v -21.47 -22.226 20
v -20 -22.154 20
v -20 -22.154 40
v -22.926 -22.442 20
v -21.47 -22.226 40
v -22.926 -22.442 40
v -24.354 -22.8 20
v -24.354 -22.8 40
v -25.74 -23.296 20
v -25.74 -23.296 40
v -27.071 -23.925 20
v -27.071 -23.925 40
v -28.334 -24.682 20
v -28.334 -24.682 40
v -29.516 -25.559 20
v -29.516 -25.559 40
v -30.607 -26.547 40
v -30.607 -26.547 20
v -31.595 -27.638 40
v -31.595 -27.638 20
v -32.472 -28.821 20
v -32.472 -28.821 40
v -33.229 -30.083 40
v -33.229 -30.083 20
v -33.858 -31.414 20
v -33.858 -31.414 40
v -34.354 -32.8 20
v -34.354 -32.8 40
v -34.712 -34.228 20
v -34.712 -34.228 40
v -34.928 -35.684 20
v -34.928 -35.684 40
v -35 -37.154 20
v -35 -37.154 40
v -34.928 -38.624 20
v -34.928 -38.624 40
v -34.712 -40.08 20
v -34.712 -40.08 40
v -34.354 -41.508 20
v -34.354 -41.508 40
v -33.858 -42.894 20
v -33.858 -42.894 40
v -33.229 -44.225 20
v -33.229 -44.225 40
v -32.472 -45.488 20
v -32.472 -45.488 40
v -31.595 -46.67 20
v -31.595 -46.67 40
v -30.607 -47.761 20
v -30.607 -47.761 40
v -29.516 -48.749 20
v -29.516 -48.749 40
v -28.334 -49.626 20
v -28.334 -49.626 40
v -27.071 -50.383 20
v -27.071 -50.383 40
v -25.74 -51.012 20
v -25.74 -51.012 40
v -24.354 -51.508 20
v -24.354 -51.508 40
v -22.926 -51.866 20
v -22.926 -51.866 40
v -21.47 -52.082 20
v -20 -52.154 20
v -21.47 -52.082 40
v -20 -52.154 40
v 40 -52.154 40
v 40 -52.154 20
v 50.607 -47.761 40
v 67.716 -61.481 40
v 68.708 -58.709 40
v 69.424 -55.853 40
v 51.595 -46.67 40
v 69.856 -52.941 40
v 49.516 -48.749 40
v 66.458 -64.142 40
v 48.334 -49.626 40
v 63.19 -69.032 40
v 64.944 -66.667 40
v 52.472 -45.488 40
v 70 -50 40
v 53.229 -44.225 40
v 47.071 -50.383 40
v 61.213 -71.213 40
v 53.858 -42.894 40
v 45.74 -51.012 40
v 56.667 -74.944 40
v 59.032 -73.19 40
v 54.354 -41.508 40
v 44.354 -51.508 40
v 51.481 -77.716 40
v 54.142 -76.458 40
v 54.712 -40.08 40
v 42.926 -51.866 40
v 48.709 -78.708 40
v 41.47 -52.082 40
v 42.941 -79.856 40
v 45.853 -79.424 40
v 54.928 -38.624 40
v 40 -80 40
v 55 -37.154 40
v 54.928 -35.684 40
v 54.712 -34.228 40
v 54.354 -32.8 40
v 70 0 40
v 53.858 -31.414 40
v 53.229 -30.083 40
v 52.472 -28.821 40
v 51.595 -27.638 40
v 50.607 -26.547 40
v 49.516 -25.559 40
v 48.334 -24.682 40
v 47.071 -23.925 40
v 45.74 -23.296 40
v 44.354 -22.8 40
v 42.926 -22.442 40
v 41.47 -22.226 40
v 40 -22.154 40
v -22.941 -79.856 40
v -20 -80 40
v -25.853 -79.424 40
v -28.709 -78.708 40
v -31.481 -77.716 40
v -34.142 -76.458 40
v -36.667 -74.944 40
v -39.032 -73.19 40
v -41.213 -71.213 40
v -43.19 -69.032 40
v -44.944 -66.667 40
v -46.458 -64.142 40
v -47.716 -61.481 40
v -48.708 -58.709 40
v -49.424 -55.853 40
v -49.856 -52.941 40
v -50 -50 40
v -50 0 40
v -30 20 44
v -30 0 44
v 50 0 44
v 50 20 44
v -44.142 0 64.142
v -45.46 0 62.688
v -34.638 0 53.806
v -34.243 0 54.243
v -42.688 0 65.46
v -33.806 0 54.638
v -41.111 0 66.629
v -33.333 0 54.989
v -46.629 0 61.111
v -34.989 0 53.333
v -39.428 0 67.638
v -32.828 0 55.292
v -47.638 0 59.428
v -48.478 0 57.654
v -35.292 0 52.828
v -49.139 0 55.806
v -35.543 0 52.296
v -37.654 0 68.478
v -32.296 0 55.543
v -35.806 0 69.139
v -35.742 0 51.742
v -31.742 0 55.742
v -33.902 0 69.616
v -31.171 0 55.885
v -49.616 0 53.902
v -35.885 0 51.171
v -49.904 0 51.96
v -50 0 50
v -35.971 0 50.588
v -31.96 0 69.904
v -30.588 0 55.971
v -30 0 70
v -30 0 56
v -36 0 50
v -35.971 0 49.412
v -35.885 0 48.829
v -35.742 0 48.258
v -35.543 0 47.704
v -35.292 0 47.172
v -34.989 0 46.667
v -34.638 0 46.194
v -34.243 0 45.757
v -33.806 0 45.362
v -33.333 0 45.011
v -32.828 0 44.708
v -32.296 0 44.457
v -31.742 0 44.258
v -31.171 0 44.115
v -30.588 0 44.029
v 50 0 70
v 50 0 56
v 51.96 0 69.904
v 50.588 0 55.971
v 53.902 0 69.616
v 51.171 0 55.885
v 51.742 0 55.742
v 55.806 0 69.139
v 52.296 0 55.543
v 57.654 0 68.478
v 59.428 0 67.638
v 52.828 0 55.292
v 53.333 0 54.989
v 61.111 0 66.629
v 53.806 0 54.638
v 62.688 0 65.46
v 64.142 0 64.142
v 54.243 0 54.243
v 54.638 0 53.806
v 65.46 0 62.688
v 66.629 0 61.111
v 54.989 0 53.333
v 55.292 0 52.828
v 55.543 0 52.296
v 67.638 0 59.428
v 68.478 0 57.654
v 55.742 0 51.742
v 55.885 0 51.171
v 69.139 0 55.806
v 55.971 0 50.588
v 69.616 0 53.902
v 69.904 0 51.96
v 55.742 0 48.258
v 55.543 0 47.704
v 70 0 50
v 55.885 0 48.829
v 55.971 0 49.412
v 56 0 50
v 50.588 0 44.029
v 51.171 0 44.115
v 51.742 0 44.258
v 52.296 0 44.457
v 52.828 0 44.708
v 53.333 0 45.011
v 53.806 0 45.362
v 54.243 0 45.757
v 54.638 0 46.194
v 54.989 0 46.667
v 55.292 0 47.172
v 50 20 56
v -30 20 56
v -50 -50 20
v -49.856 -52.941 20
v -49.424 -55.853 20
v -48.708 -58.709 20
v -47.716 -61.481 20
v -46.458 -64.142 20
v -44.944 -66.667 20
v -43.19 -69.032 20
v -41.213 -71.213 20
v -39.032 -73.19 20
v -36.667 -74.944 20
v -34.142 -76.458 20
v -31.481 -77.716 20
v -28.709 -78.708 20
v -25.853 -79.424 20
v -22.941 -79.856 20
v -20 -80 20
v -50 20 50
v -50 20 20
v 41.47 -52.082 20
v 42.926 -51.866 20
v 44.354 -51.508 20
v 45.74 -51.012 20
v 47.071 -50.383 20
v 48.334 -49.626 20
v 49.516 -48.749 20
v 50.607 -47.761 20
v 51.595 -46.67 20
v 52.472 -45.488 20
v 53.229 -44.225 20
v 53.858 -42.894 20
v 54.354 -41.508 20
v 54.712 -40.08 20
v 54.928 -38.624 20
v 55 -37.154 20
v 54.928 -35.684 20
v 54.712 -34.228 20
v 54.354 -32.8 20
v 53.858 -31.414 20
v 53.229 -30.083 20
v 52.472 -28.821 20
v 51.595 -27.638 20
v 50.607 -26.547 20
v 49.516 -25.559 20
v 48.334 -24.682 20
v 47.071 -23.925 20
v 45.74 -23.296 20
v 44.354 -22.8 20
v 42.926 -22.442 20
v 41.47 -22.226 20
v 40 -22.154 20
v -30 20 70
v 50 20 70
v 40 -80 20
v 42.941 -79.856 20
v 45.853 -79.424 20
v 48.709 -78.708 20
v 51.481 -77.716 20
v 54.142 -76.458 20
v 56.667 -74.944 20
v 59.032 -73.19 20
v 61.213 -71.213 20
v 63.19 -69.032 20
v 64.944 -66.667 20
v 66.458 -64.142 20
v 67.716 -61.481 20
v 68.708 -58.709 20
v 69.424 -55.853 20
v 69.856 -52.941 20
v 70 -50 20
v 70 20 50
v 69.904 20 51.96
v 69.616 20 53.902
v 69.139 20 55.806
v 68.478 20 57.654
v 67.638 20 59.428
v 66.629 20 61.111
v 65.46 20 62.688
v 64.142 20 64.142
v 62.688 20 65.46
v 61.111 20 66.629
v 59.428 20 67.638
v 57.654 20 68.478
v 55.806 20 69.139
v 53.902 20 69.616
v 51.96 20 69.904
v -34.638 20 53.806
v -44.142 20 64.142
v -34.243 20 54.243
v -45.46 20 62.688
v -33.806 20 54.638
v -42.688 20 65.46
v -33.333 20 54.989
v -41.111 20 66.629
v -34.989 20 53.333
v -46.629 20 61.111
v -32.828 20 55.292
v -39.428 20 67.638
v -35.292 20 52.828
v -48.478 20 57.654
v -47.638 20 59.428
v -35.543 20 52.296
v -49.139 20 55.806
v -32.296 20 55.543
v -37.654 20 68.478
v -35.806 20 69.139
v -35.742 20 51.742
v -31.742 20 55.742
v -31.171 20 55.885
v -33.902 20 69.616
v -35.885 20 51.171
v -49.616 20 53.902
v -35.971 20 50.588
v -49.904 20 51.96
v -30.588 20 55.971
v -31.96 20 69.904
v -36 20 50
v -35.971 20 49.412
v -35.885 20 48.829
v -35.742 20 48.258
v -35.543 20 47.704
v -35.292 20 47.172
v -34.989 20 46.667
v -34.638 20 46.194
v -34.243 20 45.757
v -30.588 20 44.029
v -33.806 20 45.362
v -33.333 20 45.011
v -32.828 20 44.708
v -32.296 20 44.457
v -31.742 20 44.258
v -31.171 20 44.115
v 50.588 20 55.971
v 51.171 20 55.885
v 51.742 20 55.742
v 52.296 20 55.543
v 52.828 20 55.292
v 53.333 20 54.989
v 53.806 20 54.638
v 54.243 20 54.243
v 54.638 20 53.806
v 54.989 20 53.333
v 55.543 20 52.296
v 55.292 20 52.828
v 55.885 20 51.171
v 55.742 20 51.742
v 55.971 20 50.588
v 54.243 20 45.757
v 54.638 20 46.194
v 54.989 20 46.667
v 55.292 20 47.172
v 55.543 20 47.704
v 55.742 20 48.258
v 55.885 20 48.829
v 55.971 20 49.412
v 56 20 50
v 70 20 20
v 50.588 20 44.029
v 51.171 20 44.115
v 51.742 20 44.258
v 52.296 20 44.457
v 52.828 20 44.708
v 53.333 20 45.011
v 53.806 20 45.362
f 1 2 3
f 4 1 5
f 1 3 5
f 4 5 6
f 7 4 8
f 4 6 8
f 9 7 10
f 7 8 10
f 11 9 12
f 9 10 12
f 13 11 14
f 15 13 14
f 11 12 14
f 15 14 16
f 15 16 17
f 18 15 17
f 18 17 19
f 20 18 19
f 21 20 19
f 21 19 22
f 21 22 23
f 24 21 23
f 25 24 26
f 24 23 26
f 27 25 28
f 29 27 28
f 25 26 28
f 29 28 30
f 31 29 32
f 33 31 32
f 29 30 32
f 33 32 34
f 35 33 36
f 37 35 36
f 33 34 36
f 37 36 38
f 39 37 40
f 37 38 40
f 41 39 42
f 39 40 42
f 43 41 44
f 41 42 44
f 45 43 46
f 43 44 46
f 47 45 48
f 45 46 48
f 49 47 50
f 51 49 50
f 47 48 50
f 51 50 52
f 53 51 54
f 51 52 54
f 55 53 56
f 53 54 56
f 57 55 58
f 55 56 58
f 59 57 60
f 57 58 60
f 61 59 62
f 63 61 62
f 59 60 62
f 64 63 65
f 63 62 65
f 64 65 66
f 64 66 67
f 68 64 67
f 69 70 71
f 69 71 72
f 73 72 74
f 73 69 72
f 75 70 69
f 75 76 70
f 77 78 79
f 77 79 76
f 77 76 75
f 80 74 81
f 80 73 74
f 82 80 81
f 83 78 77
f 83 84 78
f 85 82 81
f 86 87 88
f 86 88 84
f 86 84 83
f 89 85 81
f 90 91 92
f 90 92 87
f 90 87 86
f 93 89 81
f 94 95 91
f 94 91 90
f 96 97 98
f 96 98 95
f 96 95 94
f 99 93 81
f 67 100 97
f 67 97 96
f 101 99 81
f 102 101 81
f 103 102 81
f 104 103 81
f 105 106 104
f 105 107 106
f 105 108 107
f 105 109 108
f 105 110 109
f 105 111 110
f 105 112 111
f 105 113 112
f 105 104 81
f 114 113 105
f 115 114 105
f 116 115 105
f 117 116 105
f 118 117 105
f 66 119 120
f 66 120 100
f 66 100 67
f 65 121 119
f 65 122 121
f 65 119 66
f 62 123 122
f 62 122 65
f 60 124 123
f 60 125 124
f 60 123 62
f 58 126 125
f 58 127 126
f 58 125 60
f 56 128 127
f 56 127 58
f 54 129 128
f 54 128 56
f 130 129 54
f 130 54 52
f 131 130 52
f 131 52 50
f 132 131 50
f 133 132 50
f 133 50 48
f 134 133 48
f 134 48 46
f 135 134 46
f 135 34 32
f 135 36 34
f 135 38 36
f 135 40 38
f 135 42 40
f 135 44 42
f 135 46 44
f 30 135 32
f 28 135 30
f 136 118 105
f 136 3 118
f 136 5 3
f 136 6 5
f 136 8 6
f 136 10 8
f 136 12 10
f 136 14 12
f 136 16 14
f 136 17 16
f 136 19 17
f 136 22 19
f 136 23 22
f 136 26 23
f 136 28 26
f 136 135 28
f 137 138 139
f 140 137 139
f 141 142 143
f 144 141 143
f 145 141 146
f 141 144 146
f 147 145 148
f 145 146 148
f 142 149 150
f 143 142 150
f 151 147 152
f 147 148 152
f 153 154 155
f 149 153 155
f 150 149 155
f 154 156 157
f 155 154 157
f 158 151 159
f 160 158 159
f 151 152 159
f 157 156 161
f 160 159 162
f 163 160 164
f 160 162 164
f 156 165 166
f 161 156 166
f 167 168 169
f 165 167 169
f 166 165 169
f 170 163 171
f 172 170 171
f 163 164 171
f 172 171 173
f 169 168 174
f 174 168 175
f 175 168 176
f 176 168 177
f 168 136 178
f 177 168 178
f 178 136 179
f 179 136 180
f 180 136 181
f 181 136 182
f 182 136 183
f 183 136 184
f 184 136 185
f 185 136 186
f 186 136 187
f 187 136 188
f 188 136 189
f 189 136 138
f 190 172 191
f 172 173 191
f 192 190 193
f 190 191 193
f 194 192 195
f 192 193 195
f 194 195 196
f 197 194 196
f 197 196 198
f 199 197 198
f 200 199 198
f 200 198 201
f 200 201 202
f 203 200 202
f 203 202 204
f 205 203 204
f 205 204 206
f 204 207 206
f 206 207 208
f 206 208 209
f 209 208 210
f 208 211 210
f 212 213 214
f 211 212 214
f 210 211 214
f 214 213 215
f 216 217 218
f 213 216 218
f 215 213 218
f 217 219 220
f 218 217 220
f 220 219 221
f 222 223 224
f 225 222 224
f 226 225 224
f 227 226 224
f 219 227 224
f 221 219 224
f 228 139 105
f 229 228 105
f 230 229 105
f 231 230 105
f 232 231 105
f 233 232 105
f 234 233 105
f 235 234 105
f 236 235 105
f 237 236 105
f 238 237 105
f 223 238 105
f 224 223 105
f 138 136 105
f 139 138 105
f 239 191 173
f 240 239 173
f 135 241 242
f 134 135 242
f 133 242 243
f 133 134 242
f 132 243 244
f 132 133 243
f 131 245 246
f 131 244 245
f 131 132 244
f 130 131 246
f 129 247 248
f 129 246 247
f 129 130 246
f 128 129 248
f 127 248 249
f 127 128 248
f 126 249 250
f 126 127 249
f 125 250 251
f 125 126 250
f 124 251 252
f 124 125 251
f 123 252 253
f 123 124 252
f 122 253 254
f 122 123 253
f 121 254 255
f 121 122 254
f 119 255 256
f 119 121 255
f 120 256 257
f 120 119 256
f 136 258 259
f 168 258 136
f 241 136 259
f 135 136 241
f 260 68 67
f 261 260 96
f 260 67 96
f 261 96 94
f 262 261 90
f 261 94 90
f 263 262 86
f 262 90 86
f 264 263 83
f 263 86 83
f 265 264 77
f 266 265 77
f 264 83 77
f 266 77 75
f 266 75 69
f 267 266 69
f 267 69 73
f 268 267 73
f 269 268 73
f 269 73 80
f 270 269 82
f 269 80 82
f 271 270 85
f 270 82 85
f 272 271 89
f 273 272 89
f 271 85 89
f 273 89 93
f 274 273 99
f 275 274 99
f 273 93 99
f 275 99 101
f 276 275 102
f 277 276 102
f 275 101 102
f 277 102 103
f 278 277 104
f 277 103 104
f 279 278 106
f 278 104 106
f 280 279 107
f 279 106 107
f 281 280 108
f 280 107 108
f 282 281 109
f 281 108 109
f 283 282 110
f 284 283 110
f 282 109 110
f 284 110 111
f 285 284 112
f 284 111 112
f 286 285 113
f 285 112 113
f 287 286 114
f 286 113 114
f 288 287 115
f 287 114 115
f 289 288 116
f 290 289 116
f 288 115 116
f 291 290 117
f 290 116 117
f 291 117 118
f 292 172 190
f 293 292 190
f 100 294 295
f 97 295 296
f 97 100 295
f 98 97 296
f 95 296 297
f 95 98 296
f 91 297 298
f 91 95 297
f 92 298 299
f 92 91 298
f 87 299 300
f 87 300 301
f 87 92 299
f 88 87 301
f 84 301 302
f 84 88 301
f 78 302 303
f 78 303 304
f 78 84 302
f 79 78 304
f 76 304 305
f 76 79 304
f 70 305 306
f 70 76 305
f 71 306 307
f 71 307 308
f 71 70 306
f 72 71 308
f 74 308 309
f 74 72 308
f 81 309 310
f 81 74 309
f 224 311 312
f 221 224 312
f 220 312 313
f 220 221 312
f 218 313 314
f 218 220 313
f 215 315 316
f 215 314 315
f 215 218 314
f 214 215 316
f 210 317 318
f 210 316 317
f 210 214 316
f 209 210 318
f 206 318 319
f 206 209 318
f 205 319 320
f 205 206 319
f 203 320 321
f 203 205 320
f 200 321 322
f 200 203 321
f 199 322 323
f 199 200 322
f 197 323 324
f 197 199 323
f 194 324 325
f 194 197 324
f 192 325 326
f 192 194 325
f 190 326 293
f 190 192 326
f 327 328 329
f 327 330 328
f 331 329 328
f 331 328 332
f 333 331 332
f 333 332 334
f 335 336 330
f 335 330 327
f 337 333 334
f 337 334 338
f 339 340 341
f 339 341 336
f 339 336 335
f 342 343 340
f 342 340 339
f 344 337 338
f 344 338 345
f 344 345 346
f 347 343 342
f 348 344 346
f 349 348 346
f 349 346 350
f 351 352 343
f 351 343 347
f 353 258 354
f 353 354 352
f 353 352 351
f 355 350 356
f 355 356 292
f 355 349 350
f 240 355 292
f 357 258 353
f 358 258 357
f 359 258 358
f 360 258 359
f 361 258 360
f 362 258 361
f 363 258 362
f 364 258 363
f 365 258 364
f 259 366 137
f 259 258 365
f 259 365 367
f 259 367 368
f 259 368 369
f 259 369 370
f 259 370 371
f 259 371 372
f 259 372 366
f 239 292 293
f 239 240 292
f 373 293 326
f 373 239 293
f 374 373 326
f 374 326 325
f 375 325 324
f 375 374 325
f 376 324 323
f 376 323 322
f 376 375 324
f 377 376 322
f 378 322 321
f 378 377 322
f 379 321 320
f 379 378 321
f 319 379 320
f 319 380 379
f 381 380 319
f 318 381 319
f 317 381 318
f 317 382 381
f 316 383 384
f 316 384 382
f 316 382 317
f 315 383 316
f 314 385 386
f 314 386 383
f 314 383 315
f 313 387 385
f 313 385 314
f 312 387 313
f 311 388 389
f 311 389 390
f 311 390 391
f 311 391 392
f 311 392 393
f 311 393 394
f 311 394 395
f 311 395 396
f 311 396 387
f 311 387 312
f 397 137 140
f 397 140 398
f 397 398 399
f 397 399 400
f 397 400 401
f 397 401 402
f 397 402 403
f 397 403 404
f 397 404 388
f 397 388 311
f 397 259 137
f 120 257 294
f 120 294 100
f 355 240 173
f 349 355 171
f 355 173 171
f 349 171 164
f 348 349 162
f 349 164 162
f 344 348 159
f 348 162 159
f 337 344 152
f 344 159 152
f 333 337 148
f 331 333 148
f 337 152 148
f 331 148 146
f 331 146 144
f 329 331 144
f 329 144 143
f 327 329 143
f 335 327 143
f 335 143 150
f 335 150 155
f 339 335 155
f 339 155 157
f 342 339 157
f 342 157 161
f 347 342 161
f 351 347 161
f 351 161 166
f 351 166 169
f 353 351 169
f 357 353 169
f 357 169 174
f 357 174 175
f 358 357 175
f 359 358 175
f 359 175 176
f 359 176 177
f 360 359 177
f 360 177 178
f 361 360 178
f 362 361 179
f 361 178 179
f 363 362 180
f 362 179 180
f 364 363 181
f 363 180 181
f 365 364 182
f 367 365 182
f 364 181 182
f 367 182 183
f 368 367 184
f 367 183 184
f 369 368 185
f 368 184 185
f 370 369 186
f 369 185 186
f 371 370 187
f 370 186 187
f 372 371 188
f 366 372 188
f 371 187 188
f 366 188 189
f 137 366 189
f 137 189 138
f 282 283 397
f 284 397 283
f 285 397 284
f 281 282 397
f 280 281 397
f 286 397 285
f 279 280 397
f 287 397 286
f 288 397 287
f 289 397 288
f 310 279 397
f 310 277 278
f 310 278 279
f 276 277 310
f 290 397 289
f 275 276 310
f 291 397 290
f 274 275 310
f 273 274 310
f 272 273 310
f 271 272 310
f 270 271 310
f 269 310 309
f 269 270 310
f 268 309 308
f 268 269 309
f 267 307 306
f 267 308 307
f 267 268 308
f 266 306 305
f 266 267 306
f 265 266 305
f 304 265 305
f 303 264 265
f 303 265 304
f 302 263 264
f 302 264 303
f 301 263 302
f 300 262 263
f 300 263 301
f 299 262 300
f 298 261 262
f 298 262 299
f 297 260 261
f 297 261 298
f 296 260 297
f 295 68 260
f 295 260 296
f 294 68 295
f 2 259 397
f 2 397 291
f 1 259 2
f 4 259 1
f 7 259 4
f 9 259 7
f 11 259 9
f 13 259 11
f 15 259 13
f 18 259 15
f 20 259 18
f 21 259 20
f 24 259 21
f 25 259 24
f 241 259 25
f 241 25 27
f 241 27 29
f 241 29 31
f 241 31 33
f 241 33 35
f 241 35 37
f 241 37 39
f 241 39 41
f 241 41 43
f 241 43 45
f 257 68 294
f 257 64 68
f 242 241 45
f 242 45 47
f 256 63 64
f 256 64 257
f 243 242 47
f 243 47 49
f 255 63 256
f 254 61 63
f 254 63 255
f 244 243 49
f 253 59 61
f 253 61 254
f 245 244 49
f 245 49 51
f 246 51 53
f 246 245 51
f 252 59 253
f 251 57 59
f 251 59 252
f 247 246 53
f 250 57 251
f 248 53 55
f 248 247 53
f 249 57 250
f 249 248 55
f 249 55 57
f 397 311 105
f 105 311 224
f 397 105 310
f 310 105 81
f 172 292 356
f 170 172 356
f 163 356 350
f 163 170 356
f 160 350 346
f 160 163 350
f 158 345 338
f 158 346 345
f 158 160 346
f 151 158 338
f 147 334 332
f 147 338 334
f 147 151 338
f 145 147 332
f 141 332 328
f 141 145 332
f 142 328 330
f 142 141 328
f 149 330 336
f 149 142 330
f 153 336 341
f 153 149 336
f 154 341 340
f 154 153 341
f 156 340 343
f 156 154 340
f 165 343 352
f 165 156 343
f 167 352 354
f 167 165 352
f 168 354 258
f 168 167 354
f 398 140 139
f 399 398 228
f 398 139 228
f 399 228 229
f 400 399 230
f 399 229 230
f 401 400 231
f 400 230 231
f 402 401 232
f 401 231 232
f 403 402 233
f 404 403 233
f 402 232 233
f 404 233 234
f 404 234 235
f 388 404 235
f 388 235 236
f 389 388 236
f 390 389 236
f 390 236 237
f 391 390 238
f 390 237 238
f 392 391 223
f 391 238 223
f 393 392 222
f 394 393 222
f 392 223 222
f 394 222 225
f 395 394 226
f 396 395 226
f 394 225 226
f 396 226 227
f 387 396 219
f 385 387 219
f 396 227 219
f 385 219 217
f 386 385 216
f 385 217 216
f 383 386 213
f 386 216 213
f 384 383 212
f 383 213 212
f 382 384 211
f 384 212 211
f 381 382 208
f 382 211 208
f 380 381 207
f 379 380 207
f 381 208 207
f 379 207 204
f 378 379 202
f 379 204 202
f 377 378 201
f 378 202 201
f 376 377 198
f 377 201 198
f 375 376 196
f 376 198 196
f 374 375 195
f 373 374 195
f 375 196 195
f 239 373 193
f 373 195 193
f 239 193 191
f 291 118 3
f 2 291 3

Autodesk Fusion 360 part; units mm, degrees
sketch "Sketch1" plane through (0, 0, 0) normal (0, 1, 0) x (1, 0, 0)
  line L0 (-30, -70) -> (50, -70)
  line L1 (70, -50) -> (70, -20)
  line L2 (70, -20) -> (-50, -20)
  line L3 (-50, -20) -> (-50, -50)
  arc A0 (50, -70) -> (70, -50) centre (50, -50) ccw
  arc A1 (-50, -50) -> (-30, -70) centre (-30, -50) ccw
  point P0 (-50, -70)
  point P1 (70, -70)
  dimension "d1" = 120
  dimension "d2" = 50
  dimension "d3" = 20
  dimension "d4" = 20
extrude "Extrude1" add sketch "Sketch1" along normal blind 20
sketch "Sketch2" plane through (0, 0, 0) normal (0, -1, 0) x (1, 0, 0)
  arc A0 (-30, 70) -> (-50, 50) centre (-30, 50) ccw
  line L0 (-50, 50) -> (-50, 20)
  line L1 (-50, 20) -> (70, 20)
  line L2 (70, 20) -> (70, 50)
  arc A1 (70, 50) -> (50, 70) centre (50, 50) ccw
  line L3 (50, 70) -> (-30, 70)
  line L4 (-30, 44) -> (50, 44)
  arc A2 (50, 44) -> (50, 56) centre (50, 50) ccw
  line L5 (50, 56) -> (-30, 56)
  arc A3 (-30, 56) -> (-30, 44) centre (-30, 50) ccw
  line L6 (-30, 50) -> (50, 50) construction
  dimension "d7" = 12
extrude "Extrude2" cut sketch "Sketch2" against normal blind 120 contours L4 A2 L5 A3
sketch "Sketch3" plane through (-50, 0, 0) normal (-1, 0, 0) x (0, -1, 0)
  line L0 (0, 20) -> (0, 50)
  line L1 (0, 50) -> (-20, 50)
  line L2 (-20, 50) -> (-20, 20)
  line L3 (-20, 20) -> (0, 20)
  line L4 (-20, 20) -> (80, 20)
  line L5 (80, 20) -> (80, 40)
  line L6 (80, 40) -> (-20, 40)
  line L7 (-20, 40) -> (-20, 20)
  dimension "d13" = 100
  dimension "d14" = 20
extrude "Extrude3" add sketch "Sketch3" against normal blind 120 contours L0 L4 L5 L6
fillet "Fillet1" radius 30 1 edges at (-50, -80, 30)
fillet "Fillet2" radius 30 1 edges at (70, -80, 30)
sketch "Sketch4" plane through (0, 0, 40) normal (0, 0, 1) x (-1, 0, 0)
  arc A0 (-40, 80) -> (-70, 50) centre (-40, 50) ccw
  line L0 (-70, 50) -> (-70, 0)
  line L1 (-70, 0) -> (50, 0)
  line L2 (50, 0) -> (50, 50)
  arc A1 (50, 50) -> (20, 80) centre (20, 50) ccw
  line L3 (20, 80) -> (-40, 80)
  line L4 (20, 52.1541) -> (-40, 52.1541)
  arc A2 (-40, 52.1541) -> (-40, 22.1541) centre (-40, 37.1541) ccw
  line L5 (-40, 22.1541) -> (20, 22.1541)
  arc A3 (20, 22.1541) -> (20, 52.1541) centre (20, 37.1541) ccw
  line L6 (20, 37.1541) -> (-40, 37.1541) construction
  dimension "d21" = 30
  dimension "d24" = 30
extrude "Extrude4" cut sketch "Sketch4" against normal blind 80 contours L4 A2 L5 A3
